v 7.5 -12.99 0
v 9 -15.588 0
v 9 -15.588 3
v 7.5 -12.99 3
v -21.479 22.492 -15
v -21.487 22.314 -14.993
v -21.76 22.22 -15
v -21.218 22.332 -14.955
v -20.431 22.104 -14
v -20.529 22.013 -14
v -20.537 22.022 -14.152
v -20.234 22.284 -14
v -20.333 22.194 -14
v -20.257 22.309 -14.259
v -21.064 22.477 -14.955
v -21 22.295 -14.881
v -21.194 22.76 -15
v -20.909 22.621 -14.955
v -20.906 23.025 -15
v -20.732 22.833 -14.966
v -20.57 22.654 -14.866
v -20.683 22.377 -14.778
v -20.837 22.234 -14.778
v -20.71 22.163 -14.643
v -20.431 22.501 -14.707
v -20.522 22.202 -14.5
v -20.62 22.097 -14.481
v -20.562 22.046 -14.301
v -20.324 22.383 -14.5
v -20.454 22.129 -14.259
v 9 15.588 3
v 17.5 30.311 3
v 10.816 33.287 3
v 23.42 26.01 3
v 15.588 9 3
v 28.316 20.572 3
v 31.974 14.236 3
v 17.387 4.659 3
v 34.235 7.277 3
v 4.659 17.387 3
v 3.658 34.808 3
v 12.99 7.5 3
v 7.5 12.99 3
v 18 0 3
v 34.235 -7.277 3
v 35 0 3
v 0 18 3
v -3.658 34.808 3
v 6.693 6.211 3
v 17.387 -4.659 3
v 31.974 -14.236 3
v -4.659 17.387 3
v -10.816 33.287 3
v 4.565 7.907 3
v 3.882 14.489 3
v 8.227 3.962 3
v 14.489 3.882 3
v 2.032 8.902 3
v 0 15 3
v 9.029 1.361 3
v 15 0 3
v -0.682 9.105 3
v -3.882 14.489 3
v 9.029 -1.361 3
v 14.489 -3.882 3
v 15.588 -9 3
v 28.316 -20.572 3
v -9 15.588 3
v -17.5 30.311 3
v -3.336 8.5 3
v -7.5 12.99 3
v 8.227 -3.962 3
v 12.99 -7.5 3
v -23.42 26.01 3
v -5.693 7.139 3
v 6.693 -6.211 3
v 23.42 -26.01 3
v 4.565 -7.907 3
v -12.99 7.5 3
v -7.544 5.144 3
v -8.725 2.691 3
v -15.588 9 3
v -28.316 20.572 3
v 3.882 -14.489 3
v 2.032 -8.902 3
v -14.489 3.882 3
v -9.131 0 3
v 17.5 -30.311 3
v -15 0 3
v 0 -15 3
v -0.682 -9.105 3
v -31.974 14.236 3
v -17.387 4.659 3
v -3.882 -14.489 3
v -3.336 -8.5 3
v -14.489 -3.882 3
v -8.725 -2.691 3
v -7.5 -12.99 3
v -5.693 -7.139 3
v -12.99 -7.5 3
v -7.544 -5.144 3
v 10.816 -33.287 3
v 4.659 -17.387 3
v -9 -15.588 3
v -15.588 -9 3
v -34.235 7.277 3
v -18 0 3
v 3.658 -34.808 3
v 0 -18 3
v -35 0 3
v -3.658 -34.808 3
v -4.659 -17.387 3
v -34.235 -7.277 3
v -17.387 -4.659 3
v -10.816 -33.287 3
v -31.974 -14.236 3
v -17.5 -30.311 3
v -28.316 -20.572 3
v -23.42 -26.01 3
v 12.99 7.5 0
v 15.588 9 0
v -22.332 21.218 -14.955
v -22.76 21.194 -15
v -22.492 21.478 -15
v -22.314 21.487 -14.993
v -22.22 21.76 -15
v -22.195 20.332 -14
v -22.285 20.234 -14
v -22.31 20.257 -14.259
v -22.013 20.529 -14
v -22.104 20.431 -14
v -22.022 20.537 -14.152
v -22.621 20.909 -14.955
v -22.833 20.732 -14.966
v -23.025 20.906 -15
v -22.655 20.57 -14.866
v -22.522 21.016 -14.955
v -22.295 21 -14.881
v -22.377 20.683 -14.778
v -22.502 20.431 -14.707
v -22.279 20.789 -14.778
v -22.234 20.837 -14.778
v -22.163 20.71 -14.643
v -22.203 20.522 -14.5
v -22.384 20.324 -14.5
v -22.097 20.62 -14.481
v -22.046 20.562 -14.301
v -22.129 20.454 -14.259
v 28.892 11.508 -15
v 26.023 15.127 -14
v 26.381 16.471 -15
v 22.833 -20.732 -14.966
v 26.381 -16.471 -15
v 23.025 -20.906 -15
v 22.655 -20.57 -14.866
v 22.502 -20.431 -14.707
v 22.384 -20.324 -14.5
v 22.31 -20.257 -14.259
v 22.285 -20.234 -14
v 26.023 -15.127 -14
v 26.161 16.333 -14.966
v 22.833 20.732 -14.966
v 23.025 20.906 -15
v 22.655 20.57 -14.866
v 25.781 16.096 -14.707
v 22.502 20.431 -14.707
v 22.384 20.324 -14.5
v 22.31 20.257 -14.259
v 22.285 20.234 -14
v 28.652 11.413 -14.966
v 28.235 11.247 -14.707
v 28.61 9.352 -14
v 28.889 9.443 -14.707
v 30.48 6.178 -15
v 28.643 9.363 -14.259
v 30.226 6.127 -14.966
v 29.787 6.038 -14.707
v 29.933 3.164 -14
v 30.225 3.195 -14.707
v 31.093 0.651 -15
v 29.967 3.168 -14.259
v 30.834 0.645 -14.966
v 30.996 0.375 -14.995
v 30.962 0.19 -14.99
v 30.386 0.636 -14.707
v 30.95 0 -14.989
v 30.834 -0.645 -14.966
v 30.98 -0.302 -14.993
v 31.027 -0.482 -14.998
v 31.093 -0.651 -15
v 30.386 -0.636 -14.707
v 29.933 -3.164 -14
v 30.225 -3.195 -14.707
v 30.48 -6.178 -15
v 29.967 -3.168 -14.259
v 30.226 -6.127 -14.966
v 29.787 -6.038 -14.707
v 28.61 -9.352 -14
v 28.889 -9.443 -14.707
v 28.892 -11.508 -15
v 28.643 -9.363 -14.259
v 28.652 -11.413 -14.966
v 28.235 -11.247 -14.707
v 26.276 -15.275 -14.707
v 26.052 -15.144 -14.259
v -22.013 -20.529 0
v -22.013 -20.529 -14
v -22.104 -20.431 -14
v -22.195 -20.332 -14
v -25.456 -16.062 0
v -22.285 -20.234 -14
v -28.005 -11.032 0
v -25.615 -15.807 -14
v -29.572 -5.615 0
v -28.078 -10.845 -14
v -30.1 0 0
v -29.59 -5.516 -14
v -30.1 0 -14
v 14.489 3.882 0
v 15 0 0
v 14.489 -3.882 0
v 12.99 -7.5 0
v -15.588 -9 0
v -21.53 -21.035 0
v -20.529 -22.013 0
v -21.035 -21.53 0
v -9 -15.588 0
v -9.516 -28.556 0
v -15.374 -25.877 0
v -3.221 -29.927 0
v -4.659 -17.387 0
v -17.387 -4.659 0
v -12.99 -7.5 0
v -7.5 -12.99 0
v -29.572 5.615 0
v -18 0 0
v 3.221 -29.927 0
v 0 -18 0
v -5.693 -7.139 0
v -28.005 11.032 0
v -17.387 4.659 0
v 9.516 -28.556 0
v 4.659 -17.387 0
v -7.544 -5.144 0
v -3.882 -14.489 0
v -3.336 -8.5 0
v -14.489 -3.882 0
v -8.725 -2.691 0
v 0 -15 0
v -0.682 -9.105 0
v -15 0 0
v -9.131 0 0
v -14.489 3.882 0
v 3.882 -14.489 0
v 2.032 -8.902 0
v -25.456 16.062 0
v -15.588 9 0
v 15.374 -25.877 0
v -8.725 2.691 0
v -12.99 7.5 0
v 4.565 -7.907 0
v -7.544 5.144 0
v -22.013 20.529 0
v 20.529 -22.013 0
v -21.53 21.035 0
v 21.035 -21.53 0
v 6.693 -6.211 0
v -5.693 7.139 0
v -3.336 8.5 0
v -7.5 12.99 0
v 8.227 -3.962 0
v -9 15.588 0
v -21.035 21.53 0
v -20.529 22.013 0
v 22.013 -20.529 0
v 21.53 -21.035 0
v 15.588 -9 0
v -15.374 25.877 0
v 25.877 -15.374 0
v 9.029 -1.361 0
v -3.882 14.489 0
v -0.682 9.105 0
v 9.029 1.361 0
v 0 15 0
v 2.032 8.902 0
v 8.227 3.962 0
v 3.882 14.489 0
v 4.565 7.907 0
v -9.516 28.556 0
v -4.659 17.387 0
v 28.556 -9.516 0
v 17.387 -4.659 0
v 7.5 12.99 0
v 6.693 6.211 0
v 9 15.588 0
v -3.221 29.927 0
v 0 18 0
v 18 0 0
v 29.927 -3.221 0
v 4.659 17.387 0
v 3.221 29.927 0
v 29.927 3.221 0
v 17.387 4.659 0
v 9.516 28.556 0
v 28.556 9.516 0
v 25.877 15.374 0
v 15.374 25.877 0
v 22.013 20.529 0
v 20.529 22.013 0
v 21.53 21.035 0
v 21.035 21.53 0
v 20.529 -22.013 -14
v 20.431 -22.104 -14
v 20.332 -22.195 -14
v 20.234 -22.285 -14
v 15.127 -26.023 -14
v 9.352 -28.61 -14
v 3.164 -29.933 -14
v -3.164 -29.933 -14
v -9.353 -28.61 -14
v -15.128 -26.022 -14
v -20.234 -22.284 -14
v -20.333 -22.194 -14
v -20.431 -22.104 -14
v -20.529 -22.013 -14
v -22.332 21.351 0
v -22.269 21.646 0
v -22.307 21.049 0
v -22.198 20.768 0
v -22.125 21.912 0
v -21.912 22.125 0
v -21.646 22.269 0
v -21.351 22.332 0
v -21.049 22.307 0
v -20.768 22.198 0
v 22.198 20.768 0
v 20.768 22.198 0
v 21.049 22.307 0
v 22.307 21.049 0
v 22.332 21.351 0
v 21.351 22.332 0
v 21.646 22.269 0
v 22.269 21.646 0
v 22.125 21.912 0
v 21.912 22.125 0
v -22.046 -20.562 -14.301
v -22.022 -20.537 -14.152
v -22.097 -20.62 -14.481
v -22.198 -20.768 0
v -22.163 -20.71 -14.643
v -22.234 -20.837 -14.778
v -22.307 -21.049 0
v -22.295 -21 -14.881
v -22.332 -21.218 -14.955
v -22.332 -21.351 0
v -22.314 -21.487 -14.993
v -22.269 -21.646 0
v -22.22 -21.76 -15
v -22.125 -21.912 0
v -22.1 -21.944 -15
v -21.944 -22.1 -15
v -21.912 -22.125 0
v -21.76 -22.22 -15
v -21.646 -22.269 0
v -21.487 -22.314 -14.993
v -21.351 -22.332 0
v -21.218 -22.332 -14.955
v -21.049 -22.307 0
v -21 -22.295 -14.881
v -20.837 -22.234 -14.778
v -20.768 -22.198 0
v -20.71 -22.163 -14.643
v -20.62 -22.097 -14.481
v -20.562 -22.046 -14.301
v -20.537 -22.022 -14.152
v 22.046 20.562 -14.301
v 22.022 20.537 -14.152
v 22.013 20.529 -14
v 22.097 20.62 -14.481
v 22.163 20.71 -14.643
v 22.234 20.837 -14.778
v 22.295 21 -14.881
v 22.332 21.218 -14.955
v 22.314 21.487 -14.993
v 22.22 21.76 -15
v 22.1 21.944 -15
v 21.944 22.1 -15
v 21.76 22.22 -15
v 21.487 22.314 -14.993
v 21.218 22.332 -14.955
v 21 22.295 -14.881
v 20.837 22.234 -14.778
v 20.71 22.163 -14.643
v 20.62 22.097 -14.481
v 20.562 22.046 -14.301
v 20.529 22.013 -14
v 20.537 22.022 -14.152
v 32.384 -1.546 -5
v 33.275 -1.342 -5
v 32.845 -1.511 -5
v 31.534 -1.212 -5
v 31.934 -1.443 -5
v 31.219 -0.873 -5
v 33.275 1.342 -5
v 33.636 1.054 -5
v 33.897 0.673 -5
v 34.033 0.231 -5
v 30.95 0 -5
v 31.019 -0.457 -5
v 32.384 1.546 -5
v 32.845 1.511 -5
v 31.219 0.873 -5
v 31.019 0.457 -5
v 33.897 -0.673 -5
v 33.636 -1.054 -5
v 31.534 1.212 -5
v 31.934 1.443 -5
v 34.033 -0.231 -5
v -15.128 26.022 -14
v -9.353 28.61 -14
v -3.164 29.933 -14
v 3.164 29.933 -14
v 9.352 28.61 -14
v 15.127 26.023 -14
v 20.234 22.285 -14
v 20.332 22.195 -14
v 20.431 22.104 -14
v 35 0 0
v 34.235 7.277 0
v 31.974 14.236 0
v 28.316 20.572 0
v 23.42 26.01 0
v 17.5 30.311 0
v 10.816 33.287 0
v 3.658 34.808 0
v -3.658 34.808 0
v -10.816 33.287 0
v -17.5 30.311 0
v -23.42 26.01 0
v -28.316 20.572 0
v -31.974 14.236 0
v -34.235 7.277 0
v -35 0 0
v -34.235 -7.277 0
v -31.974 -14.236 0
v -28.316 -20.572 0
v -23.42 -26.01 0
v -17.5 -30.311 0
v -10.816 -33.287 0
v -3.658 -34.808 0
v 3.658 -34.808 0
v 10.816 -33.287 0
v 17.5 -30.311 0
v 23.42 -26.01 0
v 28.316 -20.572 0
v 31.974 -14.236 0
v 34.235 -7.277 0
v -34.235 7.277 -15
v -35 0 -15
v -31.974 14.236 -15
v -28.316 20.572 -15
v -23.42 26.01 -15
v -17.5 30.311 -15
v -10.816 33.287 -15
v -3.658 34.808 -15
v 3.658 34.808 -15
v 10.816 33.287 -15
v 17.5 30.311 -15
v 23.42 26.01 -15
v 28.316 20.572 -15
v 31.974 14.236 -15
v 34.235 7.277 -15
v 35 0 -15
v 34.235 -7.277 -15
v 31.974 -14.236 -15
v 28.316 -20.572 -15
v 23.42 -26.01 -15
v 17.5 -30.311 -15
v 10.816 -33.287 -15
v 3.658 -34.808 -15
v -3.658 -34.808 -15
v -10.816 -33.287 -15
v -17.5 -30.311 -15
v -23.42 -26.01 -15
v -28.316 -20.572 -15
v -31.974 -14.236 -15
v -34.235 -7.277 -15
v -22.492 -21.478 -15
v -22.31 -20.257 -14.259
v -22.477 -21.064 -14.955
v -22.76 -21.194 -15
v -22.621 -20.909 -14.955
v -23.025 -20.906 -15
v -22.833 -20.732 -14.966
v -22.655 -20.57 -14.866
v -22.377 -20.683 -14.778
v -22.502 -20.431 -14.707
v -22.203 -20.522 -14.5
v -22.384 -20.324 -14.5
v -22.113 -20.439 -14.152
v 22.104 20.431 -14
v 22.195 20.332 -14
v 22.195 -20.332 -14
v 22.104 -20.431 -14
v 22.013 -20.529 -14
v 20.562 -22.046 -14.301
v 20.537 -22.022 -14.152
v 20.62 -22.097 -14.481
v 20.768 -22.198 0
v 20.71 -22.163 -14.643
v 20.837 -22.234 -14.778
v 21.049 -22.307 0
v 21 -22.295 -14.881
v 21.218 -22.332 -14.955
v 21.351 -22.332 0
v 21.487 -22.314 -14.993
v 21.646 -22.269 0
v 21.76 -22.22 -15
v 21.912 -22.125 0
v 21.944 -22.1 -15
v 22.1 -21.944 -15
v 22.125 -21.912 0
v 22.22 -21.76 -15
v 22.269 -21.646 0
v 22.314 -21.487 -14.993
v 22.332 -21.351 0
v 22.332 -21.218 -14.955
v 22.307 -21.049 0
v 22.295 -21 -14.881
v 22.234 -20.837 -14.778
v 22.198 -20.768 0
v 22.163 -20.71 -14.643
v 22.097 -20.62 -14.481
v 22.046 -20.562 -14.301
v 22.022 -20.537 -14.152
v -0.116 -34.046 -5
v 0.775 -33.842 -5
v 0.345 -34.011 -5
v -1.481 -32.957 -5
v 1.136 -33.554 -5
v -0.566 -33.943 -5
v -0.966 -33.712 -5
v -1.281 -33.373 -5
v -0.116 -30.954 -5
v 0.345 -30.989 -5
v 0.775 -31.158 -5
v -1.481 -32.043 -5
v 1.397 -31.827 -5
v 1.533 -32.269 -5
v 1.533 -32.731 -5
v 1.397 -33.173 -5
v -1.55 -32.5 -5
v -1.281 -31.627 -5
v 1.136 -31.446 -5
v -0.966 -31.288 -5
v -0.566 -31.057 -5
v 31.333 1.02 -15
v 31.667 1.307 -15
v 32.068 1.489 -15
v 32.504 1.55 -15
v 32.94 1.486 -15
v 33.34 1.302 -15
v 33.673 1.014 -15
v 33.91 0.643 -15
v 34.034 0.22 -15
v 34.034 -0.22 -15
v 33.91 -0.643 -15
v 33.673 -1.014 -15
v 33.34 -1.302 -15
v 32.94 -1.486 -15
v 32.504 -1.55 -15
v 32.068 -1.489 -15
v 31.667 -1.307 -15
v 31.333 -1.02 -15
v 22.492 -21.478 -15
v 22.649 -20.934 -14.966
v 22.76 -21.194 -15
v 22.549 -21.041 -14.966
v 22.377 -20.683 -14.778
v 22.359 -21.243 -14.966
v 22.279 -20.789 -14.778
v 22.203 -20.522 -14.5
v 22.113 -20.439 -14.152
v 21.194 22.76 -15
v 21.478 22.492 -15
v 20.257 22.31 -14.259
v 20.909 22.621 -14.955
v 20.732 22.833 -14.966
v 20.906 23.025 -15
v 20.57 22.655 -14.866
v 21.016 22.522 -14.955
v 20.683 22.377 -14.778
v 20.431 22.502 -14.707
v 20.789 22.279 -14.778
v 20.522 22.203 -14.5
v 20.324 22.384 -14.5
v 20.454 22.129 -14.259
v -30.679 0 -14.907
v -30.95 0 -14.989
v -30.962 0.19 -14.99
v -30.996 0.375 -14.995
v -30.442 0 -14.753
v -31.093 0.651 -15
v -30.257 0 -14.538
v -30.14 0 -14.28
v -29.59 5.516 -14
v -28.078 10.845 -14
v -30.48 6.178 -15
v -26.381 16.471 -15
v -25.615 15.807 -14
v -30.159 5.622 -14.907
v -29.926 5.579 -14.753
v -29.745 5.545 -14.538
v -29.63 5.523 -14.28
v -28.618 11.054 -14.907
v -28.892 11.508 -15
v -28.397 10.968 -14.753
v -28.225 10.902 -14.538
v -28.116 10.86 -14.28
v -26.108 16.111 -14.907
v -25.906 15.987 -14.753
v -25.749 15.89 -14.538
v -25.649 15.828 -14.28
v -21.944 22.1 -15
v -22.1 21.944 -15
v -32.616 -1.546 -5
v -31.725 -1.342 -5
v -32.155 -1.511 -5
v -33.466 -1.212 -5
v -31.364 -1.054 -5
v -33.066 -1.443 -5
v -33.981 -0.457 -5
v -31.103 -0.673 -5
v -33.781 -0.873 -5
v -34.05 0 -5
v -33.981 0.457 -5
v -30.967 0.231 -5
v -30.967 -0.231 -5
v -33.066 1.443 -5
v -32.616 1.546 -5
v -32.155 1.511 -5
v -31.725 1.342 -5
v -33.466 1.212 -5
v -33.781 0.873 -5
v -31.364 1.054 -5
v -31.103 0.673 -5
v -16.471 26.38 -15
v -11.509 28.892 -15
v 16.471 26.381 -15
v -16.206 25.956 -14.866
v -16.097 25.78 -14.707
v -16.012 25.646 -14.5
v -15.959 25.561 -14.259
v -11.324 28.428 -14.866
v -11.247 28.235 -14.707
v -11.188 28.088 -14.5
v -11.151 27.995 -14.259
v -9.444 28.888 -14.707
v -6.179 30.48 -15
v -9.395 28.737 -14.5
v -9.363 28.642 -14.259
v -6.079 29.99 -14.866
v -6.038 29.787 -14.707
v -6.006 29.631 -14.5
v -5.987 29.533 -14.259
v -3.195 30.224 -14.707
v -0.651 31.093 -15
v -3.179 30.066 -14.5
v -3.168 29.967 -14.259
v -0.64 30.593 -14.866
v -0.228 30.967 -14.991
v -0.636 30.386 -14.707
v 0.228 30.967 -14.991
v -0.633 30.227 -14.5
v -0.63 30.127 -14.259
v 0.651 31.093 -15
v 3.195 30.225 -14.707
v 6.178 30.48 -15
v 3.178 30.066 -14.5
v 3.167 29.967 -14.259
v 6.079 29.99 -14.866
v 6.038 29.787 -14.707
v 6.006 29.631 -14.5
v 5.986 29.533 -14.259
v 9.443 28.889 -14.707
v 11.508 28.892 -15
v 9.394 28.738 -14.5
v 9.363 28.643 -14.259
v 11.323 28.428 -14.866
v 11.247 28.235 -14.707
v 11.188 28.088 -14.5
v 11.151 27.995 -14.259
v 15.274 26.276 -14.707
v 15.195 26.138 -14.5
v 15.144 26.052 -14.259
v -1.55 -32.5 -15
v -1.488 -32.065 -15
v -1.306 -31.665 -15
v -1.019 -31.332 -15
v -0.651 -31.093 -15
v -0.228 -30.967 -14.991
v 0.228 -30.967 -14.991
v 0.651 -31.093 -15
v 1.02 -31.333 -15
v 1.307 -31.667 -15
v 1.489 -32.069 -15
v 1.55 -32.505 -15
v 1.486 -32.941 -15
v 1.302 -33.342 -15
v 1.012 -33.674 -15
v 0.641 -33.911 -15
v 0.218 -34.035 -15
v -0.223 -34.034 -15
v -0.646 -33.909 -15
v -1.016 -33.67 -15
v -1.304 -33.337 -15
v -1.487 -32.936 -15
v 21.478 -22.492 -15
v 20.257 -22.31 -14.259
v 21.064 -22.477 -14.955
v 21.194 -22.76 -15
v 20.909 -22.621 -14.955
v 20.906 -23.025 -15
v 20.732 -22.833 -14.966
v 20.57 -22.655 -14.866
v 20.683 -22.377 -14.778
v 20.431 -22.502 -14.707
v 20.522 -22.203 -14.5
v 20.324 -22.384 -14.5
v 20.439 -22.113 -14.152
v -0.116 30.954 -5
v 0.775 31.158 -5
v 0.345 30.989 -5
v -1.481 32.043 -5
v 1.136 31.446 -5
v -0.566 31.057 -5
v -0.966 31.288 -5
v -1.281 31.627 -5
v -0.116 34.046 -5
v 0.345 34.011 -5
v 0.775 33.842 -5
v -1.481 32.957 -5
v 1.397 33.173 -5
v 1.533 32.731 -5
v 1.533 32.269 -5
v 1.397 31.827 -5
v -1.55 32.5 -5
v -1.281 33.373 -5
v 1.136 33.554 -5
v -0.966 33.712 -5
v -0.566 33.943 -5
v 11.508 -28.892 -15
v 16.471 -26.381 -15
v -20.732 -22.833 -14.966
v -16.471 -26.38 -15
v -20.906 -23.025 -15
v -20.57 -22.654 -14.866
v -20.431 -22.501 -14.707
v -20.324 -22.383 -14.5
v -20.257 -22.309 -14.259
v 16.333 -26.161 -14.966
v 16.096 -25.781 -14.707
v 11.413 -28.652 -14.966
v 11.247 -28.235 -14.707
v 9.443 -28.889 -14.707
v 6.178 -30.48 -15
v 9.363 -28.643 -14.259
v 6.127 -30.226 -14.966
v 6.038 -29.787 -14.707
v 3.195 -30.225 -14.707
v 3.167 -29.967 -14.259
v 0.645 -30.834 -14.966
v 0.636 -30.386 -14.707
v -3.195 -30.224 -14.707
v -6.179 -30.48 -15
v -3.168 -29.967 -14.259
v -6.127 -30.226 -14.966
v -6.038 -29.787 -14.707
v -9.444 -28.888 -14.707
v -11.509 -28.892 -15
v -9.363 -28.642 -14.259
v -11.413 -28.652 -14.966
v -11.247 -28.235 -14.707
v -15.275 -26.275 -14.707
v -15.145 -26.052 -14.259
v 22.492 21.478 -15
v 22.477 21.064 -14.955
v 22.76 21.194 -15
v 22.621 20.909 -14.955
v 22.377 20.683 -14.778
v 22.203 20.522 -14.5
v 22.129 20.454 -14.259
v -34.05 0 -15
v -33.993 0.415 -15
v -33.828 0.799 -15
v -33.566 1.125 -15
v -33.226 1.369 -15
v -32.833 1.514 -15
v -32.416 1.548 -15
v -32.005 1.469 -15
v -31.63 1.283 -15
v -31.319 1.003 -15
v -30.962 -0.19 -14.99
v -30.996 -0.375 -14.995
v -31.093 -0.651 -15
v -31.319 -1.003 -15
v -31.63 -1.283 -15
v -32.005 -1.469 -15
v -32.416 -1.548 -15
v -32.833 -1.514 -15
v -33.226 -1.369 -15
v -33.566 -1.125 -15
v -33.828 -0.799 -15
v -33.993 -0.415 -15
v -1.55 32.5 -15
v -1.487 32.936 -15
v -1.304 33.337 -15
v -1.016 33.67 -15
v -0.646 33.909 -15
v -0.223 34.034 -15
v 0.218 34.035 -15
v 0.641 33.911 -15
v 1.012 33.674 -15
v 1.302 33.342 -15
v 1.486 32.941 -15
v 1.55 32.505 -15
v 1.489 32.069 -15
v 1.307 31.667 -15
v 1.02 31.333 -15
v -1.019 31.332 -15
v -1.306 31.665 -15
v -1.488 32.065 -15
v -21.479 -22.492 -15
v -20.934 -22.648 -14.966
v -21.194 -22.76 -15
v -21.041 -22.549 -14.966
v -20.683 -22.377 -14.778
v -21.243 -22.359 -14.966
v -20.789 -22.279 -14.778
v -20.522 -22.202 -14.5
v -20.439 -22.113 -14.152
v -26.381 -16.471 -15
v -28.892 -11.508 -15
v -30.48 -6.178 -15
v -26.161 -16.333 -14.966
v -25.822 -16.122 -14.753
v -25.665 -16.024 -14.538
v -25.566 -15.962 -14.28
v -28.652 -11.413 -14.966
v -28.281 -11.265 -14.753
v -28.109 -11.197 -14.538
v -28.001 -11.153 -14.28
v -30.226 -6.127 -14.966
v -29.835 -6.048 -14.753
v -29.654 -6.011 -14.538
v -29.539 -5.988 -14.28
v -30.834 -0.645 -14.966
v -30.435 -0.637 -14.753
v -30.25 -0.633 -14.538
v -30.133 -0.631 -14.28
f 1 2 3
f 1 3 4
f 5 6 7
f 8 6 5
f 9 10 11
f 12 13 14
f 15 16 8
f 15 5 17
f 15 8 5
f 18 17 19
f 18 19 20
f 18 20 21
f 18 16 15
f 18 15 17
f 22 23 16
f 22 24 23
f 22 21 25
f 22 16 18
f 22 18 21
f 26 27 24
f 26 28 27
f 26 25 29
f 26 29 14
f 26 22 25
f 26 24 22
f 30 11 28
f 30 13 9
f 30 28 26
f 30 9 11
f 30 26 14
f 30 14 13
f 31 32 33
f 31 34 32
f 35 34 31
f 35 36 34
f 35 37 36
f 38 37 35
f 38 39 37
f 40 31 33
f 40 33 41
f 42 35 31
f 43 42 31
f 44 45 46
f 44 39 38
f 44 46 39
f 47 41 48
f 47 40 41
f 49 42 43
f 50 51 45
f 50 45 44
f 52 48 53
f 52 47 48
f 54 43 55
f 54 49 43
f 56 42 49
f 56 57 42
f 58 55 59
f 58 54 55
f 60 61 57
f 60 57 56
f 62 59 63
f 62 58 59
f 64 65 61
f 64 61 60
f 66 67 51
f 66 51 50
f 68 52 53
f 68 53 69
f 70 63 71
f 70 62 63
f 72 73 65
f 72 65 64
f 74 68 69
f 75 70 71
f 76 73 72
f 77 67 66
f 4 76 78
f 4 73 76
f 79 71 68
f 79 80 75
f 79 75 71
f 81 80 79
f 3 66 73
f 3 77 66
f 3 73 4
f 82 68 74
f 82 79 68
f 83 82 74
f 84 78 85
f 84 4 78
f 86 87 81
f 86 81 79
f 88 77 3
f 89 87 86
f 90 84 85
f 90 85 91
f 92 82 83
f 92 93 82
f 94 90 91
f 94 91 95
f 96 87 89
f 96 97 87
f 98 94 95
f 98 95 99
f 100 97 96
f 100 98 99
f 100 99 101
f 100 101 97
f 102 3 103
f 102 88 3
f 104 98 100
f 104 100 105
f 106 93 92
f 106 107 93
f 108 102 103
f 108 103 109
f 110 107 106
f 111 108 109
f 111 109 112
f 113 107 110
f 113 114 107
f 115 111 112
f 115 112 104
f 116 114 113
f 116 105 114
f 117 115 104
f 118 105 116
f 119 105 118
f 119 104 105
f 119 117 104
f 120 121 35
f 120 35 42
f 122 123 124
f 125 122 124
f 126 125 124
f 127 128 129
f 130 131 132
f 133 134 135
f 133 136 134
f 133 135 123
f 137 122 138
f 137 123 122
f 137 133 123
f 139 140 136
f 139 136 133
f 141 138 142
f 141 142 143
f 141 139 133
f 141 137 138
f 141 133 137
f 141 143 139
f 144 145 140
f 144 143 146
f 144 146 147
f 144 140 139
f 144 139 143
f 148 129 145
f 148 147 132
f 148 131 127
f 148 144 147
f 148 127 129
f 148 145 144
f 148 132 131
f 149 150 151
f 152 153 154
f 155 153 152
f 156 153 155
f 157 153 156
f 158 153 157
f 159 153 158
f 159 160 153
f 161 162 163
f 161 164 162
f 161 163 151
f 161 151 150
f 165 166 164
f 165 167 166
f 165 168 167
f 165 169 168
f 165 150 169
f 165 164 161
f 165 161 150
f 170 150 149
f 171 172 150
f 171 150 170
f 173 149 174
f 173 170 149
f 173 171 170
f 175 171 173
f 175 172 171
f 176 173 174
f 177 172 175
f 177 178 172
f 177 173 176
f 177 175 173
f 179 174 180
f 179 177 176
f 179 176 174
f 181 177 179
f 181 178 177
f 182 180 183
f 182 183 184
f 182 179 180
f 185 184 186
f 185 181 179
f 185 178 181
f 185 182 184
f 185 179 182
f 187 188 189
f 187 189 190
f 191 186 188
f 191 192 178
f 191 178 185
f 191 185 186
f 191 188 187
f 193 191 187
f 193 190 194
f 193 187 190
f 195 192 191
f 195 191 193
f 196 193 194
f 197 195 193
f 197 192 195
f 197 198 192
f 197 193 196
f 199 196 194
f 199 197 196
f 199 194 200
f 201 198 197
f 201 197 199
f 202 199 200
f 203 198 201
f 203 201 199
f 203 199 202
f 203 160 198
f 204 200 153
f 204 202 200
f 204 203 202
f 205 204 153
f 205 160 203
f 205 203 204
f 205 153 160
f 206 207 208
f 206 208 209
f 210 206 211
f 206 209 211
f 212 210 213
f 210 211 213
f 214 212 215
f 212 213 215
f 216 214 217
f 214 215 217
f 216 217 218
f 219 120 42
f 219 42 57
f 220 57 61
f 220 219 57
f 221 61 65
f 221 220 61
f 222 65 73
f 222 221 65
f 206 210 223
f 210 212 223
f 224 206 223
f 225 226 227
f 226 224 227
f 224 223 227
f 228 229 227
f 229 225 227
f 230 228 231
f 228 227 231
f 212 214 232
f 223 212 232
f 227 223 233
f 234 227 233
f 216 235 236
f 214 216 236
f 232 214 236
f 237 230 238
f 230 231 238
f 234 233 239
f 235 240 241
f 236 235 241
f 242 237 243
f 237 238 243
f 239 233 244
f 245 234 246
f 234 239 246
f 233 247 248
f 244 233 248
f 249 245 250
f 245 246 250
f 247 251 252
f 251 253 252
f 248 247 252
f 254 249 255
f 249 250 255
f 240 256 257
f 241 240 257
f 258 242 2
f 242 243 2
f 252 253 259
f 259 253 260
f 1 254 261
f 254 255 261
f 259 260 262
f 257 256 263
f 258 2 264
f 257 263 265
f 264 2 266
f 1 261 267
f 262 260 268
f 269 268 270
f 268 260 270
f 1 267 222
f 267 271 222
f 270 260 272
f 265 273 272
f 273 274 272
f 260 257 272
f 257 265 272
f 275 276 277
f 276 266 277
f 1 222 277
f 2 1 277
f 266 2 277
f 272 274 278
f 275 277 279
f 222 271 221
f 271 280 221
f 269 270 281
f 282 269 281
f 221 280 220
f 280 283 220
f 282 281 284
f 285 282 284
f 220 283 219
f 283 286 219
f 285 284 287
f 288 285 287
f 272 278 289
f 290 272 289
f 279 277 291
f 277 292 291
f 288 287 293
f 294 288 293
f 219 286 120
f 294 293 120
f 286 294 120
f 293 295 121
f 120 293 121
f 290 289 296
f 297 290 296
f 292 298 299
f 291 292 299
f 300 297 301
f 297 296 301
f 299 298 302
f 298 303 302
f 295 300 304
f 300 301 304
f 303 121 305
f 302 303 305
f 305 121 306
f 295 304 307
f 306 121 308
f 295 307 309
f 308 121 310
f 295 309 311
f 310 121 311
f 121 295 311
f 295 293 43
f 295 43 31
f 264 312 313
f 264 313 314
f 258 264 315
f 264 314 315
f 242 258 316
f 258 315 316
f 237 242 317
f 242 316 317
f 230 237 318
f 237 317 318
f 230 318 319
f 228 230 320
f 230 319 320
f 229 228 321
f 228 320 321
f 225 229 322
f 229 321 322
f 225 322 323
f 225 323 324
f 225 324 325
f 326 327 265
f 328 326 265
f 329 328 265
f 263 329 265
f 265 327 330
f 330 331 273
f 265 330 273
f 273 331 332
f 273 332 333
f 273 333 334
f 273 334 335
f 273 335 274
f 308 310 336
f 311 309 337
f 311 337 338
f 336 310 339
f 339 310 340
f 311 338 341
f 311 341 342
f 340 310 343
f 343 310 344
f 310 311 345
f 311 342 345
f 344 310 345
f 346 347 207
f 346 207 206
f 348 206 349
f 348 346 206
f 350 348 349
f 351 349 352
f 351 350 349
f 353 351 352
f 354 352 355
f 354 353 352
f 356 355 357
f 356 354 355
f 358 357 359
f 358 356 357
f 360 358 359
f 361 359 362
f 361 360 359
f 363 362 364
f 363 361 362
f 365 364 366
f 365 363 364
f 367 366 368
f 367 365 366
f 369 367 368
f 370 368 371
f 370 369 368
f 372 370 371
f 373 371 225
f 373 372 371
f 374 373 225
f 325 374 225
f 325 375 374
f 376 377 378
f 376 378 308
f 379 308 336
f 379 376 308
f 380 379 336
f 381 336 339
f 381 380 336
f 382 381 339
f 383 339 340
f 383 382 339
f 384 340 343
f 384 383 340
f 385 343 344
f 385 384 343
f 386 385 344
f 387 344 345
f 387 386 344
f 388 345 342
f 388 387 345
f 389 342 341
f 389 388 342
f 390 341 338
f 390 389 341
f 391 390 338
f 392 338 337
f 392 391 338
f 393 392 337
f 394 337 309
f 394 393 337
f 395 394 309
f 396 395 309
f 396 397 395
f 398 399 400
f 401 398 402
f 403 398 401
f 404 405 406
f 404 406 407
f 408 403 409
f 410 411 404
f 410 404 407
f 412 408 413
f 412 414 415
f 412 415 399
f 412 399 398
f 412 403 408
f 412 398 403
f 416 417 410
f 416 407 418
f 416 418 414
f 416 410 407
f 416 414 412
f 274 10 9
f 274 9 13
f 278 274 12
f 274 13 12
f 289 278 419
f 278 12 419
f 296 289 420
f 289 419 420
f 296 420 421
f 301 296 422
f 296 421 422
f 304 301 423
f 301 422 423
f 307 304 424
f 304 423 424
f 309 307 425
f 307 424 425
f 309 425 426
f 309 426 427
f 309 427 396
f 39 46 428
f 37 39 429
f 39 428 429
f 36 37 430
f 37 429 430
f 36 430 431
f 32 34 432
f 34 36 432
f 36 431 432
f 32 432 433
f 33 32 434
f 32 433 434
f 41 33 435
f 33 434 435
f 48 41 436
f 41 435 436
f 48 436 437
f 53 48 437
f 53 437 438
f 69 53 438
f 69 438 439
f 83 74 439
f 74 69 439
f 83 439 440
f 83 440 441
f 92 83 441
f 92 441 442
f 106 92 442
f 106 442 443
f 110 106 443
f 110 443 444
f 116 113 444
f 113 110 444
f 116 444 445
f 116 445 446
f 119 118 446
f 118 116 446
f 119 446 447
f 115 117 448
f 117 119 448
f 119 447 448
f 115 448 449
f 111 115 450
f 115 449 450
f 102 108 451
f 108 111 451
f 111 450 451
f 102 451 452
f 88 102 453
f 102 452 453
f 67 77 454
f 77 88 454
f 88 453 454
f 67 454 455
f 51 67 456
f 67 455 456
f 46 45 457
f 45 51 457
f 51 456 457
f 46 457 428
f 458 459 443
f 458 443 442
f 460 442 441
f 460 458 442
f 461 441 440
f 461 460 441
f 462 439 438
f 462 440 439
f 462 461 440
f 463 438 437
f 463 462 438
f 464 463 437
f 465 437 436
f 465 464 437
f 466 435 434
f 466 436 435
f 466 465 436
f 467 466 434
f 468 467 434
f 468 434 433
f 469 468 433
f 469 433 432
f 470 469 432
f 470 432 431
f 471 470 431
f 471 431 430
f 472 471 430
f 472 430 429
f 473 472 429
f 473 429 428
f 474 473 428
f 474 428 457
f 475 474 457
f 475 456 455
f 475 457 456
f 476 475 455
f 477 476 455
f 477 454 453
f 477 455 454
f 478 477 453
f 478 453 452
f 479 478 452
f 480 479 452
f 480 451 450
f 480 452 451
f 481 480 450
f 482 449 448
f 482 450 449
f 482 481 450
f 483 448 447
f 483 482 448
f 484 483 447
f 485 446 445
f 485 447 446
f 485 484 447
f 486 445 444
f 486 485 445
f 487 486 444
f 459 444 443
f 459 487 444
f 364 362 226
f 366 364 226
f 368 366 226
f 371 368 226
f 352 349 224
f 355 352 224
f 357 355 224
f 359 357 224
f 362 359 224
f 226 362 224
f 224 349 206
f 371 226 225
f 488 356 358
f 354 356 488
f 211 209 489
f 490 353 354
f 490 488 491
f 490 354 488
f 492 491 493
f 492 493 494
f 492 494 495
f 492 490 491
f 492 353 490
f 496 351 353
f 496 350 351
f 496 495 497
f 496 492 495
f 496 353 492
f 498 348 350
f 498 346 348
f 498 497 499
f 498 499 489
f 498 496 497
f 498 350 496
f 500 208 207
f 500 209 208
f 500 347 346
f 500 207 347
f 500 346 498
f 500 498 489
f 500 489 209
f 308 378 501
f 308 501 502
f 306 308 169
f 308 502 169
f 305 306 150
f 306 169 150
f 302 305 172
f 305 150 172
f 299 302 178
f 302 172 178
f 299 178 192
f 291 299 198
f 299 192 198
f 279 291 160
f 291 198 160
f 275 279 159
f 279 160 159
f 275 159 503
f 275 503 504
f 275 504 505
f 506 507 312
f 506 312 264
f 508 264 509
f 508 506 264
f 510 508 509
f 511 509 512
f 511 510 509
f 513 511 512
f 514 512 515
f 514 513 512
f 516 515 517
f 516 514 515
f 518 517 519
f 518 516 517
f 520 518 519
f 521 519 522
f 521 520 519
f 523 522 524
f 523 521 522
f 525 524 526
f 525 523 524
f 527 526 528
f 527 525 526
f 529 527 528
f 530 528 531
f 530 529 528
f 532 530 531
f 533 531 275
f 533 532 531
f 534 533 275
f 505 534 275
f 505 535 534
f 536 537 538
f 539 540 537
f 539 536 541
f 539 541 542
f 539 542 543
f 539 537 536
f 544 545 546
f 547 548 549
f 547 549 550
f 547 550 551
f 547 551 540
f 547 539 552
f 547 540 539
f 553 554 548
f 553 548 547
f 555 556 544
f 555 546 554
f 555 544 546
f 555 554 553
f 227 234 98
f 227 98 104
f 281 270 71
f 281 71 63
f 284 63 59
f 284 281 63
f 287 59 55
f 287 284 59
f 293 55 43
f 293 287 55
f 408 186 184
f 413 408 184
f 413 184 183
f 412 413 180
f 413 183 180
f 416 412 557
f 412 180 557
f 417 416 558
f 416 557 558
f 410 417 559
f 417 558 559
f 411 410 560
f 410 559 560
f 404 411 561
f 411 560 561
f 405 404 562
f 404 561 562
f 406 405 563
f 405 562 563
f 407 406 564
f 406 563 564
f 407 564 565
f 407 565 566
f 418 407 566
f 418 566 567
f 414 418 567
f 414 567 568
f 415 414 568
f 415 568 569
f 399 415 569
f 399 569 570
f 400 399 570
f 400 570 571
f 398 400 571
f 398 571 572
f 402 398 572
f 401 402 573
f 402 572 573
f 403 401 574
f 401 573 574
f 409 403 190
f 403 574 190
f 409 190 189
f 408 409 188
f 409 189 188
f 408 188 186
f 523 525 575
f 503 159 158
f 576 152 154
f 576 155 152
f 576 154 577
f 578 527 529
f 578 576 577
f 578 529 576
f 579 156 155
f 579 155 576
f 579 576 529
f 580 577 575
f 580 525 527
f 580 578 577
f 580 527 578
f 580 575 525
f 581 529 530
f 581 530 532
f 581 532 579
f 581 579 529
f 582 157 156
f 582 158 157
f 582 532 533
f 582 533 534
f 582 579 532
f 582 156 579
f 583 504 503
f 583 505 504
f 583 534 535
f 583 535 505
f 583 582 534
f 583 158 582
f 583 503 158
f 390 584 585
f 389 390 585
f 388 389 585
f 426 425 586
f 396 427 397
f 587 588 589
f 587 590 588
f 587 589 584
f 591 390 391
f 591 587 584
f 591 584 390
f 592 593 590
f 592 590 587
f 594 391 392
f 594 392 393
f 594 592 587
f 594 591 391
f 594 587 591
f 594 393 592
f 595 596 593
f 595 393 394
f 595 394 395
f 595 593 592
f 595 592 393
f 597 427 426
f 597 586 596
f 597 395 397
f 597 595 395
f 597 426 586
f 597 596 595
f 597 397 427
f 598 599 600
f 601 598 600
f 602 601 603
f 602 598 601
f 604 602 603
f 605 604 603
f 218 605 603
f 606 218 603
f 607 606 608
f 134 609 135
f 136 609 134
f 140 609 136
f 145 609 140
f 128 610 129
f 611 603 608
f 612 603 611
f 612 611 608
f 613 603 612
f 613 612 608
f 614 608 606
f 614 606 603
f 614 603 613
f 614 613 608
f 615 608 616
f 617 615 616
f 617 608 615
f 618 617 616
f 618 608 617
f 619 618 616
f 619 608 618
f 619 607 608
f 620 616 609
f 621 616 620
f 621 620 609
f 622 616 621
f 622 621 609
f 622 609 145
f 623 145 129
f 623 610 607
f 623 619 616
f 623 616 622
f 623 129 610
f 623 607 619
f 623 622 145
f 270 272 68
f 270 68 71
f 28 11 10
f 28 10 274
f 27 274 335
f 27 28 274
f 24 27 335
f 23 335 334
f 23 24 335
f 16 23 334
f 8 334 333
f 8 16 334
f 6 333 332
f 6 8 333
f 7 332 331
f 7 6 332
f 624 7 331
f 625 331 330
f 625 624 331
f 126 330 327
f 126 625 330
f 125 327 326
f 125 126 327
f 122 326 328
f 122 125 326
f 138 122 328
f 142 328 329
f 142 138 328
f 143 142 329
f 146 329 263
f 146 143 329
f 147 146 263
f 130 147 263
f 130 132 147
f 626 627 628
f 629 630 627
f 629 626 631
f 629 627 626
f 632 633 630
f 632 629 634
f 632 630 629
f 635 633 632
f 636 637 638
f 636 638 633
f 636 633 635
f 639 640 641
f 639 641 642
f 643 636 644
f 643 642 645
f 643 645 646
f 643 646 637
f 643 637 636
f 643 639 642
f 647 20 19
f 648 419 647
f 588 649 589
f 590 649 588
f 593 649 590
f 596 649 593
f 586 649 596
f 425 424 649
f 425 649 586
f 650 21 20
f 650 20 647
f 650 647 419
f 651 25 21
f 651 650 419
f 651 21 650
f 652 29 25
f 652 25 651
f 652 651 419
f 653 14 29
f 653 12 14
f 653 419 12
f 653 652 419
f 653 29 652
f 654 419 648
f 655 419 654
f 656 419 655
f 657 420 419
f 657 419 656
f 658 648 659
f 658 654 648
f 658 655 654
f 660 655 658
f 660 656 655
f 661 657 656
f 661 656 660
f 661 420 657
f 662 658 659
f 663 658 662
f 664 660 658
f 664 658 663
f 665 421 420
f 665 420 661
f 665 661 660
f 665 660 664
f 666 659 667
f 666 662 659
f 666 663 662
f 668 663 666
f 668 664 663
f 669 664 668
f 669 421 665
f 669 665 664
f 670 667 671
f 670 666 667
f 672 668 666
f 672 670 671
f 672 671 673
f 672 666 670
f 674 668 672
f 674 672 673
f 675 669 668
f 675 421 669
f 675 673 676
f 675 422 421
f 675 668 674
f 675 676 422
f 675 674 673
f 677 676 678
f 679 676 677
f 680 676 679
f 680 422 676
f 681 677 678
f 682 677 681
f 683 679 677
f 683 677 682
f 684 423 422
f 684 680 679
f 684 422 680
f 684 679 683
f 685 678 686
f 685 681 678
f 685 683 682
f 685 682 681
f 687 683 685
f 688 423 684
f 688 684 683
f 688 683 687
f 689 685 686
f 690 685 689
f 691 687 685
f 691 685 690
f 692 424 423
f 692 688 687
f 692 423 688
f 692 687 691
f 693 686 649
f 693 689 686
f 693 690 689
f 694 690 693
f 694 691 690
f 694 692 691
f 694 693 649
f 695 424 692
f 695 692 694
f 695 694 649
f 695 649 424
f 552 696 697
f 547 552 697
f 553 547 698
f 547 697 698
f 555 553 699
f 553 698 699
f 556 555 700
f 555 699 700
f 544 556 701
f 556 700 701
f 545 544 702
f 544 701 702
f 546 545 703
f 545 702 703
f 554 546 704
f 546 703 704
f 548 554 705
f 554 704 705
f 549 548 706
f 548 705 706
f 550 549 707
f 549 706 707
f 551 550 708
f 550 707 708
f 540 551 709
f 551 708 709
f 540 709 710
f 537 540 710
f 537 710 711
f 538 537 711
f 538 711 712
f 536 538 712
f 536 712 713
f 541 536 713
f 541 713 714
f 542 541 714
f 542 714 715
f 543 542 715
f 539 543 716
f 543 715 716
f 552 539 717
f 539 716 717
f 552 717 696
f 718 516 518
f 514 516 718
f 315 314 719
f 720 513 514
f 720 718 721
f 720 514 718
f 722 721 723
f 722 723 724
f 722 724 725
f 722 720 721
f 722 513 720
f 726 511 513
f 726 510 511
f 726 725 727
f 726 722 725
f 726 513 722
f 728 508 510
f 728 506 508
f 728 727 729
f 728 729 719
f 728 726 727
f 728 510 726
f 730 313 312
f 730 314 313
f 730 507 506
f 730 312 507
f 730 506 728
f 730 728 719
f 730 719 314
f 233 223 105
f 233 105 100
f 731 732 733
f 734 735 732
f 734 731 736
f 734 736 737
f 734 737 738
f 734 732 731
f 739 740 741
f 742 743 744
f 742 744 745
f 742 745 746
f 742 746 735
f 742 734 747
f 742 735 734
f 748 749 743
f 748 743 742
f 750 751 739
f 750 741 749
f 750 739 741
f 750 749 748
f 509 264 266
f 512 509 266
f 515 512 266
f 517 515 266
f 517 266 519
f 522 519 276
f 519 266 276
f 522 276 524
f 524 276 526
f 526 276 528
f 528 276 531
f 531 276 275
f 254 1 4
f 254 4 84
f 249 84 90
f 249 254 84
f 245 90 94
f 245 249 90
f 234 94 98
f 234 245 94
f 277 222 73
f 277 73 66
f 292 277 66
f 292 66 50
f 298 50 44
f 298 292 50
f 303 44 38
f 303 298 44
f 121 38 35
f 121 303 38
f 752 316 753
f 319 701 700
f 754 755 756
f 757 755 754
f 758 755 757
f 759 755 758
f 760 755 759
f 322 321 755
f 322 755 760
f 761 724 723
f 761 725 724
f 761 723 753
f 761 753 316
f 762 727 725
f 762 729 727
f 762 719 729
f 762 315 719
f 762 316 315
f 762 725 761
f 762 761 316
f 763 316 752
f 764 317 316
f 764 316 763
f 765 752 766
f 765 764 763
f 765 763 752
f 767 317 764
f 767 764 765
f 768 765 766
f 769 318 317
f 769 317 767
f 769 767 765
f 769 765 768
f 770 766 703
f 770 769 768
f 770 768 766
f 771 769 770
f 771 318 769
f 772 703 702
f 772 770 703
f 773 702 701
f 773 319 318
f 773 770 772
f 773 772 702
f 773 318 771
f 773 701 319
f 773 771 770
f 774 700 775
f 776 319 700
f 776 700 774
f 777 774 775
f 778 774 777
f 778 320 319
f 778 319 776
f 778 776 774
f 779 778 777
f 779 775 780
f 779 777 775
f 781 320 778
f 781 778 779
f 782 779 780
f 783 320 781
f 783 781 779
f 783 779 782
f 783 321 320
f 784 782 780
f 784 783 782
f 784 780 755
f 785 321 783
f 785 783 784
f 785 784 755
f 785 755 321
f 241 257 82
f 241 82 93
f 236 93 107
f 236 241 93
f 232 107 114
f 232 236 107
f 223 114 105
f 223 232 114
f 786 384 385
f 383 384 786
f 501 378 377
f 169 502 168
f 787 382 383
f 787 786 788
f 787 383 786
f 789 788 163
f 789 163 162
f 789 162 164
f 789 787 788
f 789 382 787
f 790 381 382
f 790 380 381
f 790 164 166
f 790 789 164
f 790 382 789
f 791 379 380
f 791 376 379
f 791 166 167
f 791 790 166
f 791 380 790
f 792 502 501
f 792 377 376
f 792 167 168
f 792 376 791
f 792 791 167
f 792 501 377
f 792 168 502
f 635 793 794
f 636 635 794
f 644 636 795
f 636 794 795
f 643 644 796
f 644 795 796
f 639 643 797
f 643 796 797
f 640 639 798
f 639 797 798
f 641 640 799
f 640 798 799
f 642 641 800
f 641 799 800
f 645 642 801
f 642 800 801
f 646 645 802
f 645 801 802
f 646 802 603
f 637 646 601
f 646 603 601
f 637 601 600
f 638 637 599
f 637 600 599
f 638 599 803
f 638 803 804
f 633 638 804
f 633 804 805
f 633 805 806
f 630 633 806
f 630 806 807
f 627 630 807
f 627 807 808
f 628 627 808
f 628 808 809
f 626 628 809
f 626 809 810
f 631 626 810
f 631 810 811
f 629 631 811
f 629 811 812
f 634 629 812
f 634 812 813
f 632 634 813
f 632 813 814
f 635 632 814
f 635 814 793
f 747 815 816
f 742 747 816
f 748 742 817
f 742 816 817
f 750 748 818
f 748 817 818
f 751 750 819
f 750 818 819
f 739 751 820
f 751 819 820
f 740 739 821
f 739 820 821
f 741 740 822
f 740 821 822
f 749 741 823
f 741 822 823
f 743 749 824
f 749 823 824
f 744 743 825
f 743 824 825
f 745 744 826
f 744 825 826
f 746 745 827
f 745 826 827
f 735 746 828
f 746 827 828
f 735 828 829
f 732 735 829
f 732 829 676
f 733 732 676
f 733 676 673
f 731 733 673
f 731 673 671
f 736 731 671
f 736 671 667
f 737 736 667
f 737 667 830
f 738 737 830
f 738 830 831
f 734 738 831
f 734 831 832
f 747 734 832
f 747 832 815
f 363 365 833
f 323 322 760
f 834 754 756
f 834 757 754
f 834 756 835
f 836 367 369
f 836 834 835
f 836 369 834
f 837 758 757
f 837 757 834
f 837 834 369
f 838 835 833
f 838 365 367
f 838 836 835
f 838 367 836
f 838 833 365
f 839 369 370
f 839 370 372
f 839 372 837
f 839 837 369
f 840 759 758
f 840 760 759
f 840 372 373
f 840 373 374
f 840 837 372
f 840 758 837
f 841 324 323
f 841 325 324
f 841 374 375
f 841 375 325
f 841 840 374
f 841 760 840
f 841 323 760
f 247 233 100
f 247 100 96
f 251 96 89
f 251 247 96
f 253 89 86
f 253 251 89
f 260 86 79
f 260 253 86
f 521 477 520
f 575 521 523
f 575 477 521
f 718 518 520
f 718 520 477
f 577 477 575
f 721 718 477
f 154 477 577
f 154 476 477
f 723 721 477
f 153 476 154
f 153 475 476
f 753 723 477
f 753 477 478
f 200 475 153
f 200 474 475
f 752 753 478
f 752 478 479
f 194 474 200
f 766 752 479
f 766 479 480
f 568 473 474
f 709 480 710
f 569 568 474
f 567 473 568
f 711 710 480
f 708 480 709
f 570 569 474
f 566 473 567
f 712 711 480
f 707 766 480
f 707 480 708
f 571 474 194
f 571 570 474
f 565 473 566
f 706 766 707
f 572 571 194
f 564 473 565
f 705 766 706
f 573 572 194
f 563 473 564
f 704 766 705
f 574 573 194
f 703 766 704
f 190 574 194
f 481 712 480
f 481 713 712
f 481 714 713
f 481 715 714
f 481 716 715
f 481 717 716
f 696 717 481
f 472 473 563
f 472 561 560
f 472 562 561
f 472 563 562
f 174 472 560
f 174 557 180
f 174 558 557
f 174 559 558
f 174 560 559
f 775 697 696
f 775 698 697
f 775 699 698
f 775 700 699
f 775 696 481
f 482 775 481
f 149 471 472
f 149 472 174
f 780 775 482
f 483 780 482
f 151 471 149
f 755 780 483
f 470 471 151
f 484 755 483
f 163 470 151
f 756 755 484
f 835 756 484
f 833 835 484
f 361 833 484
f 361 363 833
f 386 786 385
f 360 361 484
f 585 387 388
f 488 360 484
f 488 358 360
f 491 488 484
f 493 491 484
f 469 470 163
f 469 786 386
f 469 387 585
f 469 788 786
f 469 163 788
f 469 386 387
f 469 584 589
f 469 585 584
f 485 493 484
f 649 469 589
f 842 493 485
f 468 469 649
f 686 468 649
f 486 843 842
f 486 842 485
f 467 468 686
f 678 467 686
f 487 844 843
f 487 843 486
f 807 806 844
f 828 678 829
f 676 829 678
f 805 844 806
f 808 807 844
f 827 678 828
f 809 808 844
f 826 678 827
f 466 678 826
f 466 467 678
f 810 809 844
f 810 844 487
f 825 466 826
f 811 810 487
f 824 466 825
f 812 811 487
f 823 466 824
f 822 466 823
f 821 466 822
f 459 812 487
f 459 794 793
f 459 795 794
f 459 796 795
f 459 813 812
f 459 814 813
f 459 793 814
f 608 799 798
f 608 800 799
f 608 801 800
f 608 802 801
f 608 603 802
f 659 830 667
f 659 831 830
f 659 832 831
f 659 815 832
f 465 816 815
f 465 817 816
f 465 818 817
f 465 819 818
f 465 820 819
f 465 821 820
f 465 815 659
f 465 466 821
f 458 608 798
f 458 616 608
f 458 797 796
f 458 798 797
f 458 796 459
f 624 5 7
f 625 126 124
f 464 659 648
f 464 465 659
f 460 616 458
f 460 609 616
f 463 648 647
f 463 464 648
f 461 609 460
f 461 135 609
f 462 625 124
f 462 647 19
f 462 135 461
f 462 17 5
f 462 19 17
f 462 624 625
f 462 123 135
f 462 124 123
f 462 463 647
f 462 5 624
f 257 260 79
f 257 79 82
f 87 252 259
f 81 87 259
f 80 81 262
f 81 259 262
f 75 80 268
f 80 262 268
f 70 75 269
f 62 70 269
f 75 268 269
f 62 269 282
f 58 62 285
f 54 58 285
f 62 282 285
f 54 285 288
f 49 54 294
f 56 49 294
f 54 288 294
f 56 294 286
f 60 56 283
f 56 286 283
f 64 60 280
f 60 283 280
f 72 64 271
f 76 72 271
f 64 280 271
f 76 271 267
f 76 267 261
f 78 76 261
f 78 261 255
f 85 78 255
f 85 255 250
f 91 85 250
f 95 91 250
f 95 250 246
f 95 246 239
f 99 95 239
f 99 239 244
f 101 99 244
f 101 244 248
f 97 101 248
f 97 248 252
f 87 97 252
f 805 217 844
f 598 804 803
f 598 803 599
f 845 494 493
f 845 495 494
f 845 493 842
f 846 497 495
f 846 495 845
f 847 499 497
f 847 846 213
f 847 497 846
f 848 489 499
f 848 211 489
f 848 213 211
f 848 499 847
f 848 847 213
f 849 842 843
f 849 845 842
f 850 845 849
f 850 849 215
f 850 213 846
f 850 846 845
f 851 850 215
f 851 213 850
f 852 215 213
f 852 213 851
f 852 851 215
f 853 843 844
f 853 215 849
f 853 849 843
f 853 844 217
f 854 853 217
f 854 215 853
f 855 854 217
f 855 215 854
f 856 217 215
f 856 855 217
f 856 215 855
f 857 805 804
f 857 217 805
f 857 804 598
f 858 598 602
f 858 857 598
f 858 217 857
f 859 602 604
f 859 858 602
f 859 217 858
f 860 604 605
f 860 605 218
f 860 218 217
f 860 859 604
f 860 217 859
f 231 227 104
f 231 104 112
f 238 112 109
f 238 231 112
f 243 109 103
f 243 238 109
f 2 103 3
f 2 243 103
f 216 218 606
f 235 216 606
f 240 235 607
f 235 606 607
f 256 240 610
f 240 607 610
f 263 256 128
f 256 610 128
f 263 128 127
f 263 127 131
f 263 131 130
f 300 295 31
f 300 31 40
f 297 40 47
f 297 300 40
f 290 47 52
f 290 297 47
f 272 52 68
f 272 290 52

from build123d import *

# Parameters (mm, degrees)
SKETCH_2_R          = 35
SKETCH_2_R_2        = 5.5
EXTRUDE_1_DEPTH     = 5
EXTRUDE_START       = 15
SKETCH_3_R          = 35
SKETCH_3_R_2        = 30.1
EXTRUDE_2_DEPTH     = 15
SKETCH_4_R          = 1.55
CUT_EXTRUDE_1_DEPTH = 10
CUT_EXTRUDE_5_DEPTH = 15
FILLET_1_R          = 1
CUT_EXTRUDE_START   = -2
SKETCH_10_R         = 35
CUT_EXTRUDE_6_DEPTH = 2
CUT_EXTRUDE_7_DEPTH = 10
SKETCH1_R           = 9.130787709
CUT_EXTRUDE1_DEPTH  = 52.720402193


with BuildPart() as part:
    # 草图2 → 凸台-拉伸1 (new body)
    with BuildSketch(Plane.XY):
        Circle(SKETCH_2_R)
        Circle(SKETCH_2_R_2, mode=Mode.SUBTRACT)
    extrude(amount=EXTRUDE_1_DEPTH)

    # 草图3 → 凸台-拉伸2 (add)
    with BuildSketch(Plane(origin=(0, 0, 0), x_dir=(-1, 0, 0), z_dir=(0, 0, -1)).offset(EXTRUDE_START)):
        Circle(SKETCH_3_R)
        Circle(SKETCH_3_R_2, mode=Mode.SUBTRACT)
    extrude(amount=-EXTRUDE_2_DEPTH)

    # 草图4 → 切除-拉伸1 (cut)
    with BuildSketch(Plane(origin=(0, 0, -15), x_dir=(-1, 0, 0), z_dir=(0, 0, -1))):
        with Locations((0, 32.5)):
            Circle(SKETCH_4_R)
        with Locations((32.5, 0)):
            Circle(SKETCH_4_R)
        with Locations((0, -32.5)):
            Circle(SKETCH_4_R)
        with Locations((-32.5, 0)):
            Circle(SKETCH_4_R)
    extrude(amount=-CUT_EXTRUDE_1_DEPTH, mode=Mode.SUBTRACT)

    # 草图9 → 切除-拉伸5 (cut)
    with BuildSketch(Plane(origin=(0, 0, -15), x_dir=(-1, 0, 0), z_dir=(0, 0, -1))):
        with BuildLine():
            ThreePointArc((-22.013313369, 20.528615017), (-22.026376234, 22.026376234), (-20.528615017, 22.013313369))
            ThreePointArc((-20.528615017, 22.013313369), (-21.283914114, 21.283914114), (-22.013313369, 20.528615017))
        make_face()
        with BuildLine():
            ThreePointArc((20.528615017, 22.013313369), (22.026376234, 22.026376234), (22.013313369, 20.528615017))
            ThreePointArc((22.013313369, 20.528615017), (21.283914114, 21.283914114), (20.528615017, 22.013313369))
        make_face()
        with BuildLine():
            ThreePointArc((22.013313369, -20.528615017), (22.026376234, -22.026376234), (20.528615017, -22.013313369))
            ThreePointArc((20.528615017, -22.013313369), (21.283914114, -21.283914114), (22.013313369, -20.528615017))
        make_face()
        with BuildLine():
            ThreePointArc((-20.528615017, -22.013313369), (-22.026376234, -22.026376234), (-22.013313369, -20.528615017))
            ThreePointArc((-22.013313369, -20.528615017), (-21.283914114, -21.283914114), (-20.528615017, -22.013313369))
        make_face()
    extrude(amount=-CUT_EXTRUDE_5_DEPTH, mode=Mode.SUBTRACT)

    # 圆角1
    # the kernel refuses this fillet: 1 mm, written as the material it takes off along each edge
    with BuildSketch(Plane(origin=(0, 0, -15), x_dir=(-0.7403558797037455, 0.6722151228498904, 0), z_dir=(-0.6722151228498904, -0.7403558797037455, 0))) as fillet_1_piece_1:
        with BuildLine():
            CenterArc((30.1 + FILLET_1_R, -FILLET_1_R), FILLET_1_R, 90, 90)
            Line((30.1, -FILLET_1_R), (30.1, 0))
            Line((30.1, 0), (30.1 + FILLET_1_R, 0))
        make_face()
    revolve(axis=Axis((0, 0, -15), (0, 0, -1)), revolution_arc=95.523479776, mode=Mode.SUBTRACT)
    with BuildSketch(Plane(origin=(0, 0, -15), x_dir=(0.6722151228498918, 0.7403558797037441, 0), z_dir=(-0.7403558797037441, 0.6722151228498918, 0))) as fillet_1_piece_2:
        with BuildLine():
            CenterArc((30.1 + FILLET_1_R, -FILLET_1_R), FILLET_1_R, 90, 90)
            Line((30.1, -FILLET_1_R), (30.1, 0))
            Line((30.1, 0), (30.1 + FILLET_1_R, 0))
        make_face()
    revolve(axis=Axis((0, 0, -15), (0, 0, -1)), revolution_arc=95.523479776, mode=Mode.SUBTRACT)
    with BuildSketch(Plane(origin=(0, 0, -15), x_dir=(0.7403558797037453, -0.6722151228498905, 0), z_dir=(0.6722151228498905, 0.7403558797037453, 0))) as fillet_1_piece_3:
        with BuildLine():
            CenterArc((30.1 + FILLET_1_R, -FILLET_1_R), FILLET_1_R, 90, 90)
            Line((30.1, -FILLET_1_R), (30.1, 0))
            Line((30.1, 0), (30.1 + FILLET_1_R, 0))
        make_face()
    revolve(axis=Axis((0, 0, -15), (0, 0, -1)), revolution_arc=95.523479776, mode=Mode.SUBTRACT)
    with BuildSketch(Plane(origin=(0, 0, -15), x_dir=(-1, 0, 0), z_dir=(0, -1, 0))) as fillet_1_piece_4:
        with BuildLine():
            CenterArc((30.1 + FILLET_1_R, -FILLET_1_R), FILLET_1_R, 90, 90)
            Line((30.1, -FILLET_1_R), (30.1, 0))
            Line((30.1, 0), (30.1 + FILLET_1_R, 0))
        make_face()
    revolve(axis=Axis((0, 0, -15), (0, 0, -1)), revolution_arc=47.760430641, mode=Mode.SUBTRACT)
    with BuildSketch(Plane(origin=(0, 0, -15), x_dir=(-0.6722320403041436, -0.7403405189428228, 0), z_dir=(0.7403405189428228, -0.6722320403041436, 0))) as fillet_1_piece_5:
        with BuildLine():
            CenterArc((30.1 + FILLET_1_R, -FILLET_1_R), FILLET_1_R, 90, 90)
            Line((30.1, -FILLET_1_R), (30.1, 0))
            Line((30.1, 0), (30.1 + FILLET_1_R, 0))
        make_face()
    revolve(axis=Axis((0, 0, -15), (0, 0, -1)), revolution_arc=47.760430641, mode=Mode.SUBTRACT)

    # 草图10 → 切除-拉伸6 (cut)
    with BuildSketch(Plane.XY.offset(5).offset(CUT_EXTRUDE_START)):
        with Locations(Location((0, 0, 0), (0, 0, 180))):
            Circle(SKETCH_10_R)
    extrude(amount=CUT_EXTRUDE_6_DEPTH, mode=Mode.SUBTRACT)

    # 草图11 → 切除-拉伸7 (cut)
    with BuildSketch(Plane(origin=(0, 0, 0), x_dir=(-1, 0, 0), z_dir=(0, 0, -1))):
        with BuildLine():
            Line((12.990381057, 7.5), (15.588457268, 9))
            ThreePointArc((15.588457268, 9), (18, 0), (15.588457268, -9))
            Line((15.588457268, -9), (12.990381057, -7.5))
            ThreePointArc((12.990381057, -7.5), (15, 0), (12.990381057, 7.5))
        make_face()
        with BuildLine():
            Line((-7.5, 12.990381057), (-9, 15.588457268))
            ThreePointArc((-9, 15.588457268), (0, 18), (9, 15.588457268))
            Line((9, 15.588457268), (7.5, 12.990381057))
            ThreePointArc((7.5, 12.990381057), (0, 15), (-7.5, 12.990381057))
        make_face()
        with BuildLine():
            Line((7.5, -12.990381057), (9, -15.588457268))
            ThreePointArc((9, -15.588457268), (0, -18), (-9, -15.588457268))
            Line((-9, -15.588457268), (-7.5, -12.990381057))
            ThreePointArc((-7.5, -12.990381057), (0, -15), (7.5, -12.990381057))
        make_face()
        with BuildLine():
            Line((-12.990381057, -7.5), (-15.588457268, -9))
            ThreePointArc((-15.588457268, -9), (-18, 0), (-15.588457268, 9))
            Line((-15.588457268, 9), (-12.990381057, 7.5))
            ThreePointArc((-12.990381057, 7.5), (-15, 0), (-12.990381057, -7.5))
        make_face()
    extrude(amount=-CUT_EXTRUDE_7_DEPTH, mode=Mode.SUBTRACT)

    # Sketch1 → Cut-Extrude1 (cut, through all)
    with BuildSketch(Plane(origin=(0, 0, 0), x_dir=(-1, 0, 0), z_dir=(0, 0, -1))):
        Circle(SKETCH1_R)
    extrude(amount=-CUT_EXTRUDE1_DEPTH, mode=Mode.SUBTRACT)


solid = part.part
